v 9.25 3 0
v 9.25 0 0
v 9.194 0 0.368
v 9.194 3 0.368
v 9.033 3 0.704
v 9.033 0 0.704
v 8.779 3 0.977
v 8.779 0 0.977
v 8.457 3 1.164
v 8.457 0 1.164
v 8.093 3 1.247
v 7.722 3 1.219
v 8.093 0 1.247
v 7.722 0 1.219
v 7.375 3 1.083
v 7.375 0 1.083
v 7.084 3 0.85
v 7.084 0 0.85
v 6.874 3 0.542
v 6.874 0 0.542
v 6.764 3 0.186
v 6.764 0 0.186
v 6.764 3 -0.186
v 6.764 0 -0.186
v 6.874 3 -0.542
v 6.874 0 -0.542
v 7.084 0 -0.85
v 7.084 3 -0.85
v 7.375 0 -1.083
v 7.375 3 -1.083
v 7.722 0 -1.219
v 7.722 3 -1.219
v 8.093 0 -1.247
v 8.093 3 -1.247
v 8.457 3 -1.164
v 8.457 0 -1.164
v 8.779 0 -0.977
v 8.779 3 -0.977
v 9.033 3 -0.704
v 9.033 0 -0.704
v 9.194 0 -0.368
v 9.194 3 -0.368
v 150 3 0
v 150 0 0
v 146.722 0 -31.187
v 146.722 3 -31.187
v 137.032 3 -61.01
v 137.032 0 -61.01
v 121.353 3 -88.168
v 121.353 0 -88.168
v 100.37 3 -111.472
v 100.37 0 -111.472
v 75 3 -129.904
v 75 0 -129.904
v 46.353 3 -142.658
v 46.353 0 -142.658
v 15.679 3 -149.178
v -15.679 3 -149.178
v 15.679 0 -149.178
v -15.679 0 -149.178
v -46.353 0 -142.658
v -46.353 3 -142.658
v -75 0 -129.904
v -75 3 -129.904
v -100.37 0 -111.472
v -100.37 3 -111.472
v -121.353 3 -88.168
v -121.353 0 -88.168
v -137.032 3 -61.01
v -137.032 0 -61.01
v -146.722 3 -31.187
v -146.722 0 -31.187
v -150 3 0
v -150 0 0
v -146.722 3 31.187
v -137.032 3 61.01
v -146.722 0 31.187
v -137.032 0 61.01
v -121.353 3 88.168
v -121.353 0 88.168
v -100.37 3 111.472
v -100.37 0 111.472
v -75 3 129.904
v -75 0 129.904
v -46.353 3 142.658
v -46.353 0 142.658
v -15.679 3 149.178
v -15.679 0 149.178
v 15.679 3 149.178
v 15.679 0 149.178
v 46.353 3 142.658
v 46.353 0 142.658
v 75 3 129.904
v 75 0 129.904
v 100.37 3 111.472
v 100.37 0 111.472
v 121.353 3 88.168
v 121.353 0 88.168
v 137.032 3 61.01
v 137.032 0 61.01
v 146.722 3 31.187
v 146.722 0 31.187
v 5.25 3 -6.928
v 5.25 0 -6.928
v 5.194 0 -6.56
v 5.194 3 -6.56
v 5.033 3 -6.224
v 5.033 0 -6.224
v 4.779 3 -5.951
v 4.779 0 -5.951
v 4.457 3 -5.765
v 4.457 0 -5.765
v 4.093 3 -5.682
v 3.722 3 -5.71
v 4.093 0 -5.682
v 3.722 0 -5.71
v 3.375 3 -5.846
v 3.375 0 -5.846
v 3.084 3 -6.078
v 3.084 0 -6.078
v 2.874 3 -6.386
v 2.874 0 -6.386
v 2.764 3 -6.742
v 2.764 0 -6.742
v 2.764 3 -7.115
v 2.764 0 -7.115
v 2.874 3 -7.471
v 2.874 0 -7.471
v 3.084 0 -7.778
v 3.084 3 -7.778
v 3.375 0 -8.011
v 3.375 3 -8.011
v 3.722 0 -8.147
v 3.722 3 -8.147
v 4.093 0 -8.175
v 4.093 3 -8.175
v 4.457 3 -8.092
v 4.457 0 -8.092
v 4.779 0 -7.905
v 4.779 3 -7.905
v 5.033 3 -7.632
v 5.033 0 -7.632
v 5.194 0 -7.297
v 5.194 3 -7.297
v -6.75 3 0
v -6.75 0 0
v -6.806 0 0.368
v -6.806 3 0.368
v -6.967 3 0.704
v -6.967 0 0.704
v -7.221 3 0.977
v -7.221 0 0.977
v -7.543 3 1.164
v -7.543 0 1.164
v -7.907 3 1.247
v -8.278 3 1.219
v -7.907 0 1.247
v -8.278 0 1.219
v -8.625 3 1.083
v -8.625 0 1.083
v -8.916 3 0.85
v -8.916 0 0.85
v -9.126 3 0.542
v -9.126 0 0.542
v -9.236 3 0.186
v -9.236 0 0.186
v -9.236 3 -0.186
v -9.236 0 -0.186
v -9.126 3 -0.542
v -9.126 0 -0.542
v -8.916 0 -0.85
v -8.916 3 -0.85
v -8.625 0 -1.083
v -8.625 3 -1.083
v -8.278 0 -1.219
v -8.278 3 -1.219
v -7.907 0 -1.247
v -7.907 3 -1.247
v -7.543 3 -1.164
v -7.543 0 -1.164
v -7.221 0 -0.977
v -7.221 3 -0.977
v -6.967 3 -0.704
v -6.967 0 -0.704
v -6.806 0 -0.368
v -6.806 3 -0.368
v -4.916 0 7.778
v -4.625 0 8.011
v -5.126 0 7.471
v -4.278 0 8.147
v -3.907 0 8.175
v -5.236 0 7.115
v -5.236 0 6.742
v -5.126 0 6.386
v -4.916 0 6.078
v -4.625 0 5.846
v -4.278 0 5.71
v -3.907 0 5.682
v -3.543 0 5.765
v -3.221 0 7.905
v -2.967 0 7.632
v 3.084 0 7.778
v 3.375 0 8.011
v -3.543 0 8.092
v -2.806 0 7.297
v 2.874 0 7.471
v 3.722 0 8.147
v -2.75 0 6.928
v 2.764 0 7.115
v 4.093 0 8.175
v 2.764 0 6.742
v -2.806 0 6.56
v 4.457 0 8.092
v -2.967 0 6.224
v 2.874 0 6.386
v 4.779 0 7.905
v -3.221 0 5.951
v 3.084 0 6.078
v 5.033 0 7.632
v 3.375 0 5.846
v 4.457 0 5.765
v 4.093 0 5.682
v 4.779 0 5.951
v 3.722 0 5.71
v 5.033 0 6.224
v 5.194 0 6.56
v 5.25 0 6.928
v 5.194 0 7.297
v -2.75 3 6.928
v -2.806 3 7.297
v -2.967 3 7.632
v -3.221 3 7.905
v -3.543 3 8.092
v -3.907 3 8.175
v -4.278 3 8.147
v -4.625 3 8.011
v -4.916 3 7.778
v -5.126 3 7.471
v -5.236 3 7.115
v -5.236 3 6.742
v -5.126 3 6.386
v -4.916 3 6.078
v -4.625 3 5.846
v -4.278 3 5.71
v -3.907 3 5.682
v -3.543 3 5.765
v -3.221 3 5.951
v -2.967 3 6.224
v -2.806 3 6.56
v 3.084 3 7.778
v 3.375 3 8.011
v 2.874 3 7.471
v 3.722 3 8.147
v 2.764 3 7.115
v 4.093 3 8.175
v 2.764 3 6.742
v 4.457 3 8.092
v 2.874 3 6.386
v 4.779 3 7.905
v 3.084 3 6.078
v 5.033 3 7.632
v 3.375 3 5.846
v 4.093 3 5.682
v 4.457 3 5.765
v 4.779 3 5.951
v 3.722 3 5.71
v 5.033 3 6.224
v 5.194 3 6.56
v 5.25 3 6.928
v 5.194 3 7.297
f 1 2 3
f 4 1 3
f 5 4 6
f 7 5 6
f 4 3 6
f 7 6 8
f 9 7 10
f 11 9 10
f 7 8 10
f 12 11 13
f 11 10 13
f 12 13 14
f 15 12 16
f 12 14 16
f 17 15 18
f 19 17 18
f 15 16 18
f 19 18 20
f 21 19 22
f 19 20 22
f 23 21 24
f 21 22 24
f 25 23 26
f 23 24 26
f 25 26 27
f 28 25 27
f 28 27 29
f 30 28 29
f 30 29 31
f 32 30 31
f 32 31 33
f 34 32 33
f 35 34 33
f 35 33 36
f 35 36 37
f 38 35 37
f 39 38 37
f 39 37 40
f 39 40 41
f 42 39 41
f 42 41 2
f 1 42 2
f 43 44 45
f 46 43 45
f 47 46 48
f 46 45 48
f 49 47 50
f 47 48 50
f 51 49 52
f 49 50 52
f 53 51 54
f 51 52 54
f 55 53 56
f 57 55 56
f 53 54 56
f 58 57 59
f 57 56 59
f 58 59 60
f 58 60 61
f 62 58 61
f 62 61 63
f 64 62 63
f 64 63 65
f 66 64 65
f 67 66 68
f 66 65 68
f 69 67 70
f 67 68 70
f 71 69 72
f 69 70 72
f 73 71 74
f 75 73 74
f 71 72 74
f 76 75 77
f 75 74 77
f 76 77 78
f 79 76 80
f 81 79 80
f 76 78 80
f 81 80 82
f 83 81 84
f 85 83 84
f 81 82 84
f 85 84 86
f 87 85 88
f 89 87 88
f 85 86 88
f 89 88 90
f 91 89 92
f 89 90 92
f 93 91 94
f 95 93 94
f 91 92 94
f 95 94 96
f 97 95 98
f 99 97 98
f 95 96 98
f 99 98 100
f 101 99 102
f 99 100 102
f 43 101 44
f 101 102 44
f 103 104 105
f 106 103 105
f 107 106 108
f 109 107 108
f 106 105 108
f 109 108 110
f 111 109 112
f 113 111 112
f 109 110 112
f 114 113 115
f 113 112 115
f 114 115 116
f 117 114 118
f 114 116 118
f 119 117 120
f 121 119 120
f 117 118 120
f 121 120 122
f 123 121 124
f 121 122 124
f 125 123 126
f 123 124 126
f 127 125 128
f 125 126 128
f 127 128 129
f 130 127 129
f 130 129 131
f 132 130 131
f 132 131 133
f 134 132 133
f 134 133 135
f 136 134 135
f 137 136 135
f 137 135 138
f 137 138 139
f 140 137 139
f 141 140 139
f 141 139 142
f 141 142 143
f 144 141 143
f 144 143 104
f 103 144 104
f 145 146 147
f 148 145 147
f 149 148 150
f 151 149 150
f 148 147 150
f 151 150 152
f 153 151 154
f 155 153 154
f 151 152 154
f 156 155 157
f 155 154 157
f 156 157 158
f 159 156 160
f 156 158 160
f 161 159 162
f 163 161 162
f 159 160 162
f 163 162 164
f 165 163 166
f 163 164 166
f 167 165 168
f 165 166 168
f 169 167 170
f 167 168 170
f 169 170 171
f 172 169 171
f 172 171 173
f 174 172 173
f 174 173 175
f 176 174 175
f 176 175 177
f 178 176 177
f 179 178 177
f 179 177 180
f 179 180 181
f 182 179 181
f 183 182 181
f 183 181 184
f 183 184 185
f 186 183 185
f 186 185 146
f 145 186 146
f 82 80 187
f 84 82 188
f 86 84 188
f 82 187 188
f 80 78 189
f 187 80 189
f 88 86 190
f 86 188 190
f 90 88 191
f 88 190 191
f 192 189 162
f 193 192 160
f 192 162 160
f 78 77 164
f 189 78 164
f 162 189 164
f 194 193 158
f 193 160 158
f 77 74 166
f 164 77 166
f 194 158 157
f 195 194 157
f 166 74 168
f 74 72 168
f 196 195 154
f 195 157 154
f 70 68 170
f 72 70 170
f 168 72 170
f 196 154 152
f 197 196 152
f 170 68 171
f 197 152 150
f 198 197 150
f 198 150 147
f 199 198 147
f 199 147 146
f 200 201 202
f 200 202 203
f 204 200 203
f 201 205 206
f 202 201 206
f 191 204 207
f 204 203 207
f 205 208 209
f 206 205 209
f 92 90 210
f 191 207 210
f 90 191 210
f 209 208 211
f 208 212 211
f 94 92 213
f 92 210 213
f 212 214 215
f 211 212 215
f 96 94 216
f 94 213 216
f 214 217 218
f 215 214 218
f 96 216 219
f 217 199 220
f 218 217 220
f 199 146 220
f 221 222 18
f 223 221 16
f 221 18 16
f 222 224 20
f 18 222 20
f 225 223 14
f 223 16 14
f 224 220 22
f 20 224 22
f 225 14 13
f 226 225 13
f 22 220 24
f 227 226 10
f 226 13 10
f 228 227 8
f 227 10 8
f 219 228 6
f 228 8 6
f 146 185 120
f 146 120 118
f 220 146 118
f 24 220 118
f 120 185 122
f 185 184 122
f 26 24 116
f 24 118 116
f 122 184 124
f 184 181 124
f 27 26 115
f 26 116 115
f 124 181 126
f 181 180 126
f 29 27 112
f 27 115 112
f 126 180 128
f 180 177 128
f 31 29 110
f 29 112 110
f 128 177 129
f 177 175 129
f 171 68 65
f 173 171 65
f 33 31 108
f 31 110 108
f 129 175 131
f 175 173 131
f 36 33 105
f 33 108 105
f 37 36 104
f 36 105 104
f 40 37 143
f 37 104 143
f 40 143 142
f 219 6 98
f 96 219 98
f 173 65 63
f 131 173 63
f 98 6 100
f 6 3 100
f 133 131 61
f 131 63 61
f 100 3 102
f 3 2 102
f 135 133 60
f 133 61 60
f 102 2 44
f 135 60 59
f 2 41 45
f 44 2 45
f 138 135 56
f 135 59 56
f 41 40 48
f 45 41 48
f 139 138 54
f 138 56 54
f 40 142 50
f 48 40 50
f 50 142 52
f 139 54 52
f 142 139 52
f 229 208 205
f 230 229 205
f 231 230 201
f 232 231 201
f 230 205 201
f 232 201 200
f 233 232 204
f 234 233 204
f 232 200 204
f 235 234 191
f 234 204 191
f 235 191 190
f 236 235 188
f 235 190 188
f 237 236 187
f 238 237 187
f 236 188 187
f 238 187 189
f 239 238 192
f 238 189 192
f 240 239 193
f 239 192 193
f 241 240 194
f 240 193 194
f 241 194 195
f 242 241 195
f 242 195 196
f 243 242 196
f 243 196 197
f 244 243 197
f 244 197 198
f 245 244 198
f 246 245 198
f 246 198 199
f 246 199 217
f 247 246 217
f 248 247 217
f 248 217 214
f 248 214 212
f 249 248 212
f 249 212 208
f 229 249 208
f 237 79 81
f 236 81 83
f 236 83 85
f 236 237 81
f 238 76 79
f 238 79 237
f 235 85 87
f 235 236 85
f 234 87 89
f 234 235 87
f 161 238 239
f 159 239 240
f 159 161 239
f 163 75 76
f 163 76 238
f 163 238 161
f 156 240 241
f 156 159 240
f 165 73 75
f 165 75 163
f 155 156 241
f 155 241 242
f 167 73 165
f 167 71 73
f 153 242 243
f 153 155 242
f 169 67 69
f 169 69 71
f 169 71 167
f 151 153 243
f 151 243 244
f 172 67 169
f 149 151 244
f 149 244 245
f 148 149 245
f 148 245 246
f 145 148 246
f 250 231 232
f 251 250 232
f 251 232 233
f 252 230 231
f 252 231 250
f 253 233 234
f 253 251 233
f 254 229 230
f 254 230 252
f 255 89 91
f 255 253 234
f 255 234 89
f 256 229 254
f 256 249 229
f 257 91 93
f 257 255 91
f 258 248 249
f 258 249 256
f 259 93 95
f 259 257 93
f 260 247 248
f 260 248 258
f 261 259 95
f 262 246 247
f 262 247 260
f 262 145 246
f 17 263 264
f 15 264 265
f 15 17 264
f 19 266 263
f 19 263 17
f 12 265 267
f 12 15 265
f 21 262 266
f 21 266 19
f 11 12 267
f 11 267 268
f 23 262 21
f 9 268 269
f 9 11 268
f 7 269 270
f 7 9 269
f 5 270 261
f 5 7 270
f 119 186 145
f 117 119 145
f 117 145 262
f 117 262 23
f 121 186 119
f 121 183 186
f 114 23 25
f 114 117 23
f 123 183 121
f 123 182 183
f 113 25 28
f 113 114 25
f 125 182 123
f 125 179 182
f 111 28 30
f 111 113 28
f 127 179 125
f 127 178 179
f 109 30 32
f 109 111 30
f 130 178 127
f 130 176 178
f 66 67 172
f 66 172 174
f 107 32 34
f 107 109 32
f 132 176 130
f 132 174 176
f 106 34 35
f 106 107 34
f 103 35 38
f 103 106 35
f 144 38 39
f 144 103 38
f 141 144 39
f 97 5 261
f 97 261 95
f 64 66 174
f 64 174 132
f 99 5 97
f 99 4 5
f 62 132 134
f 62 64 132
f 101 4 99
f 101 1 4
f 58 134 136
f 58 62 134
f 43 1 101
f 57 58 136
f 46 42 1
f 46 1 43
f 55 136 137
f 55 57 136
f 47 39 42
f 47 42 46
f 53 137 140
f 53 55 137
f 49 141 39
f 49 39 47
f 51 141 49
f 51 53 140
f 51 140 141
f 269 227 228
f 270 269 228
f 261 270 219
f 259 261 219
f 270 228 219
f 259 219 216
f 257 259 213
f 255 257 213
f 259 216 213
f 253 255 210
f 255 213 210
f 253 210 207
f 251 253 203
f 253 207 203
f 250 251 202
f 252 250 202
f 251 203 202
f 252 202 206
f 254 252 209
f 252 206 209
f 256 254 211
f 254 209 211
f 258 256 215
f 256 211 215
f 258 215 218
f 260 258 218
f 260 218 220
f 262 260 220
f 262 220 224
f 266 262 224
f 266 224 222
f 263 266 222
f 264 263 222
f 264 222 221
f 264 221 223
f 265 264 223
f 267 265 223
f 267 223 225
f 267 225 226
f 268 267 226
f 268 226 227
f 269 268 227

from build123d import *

# Parameters (mm, degrees)
SKETCH1_R           = 150
BOSS_EXTRUDE1_DEPTH = 3
SKETCH3_R           = 1.25
CUT_EXTRUDE1_DEPTH  = 10


with BuildPart() as part:
    # Sketch1 → Boss-Extrude1 (new body)
    with BuildSketch(Plane(origin=(0, 0, 0), x_dir=(1, 0, 0), z_dir=(0, 1, 0))):
        Circle(SKETCH1_R)
    extrude(amount=BOSS_EXTRUDE1_DEPTH)

    # Sketch3 → Cut-Extrude1 (cut)
    with BuildSketch(Plane.XZ):
        with Locations((8, 0)):
            Circle(SKETCH3_R)
        with Locations((4, 6.92820323)):
            Circle(SKETCH3_R)
        with Locations((4, -6.92820323)):
            Circle(SKETCH3_R)
        with Locations((-4, 6.92820323)):
            Circle(SKETCH3_R)
        with Locations((-8, 0)):
            Circle(SKETCH3_R)
    extrude(amount=-CUT_EXTRUDE1_DEPTH, mode=Mode.SUBTRACT)


solid = part.part
